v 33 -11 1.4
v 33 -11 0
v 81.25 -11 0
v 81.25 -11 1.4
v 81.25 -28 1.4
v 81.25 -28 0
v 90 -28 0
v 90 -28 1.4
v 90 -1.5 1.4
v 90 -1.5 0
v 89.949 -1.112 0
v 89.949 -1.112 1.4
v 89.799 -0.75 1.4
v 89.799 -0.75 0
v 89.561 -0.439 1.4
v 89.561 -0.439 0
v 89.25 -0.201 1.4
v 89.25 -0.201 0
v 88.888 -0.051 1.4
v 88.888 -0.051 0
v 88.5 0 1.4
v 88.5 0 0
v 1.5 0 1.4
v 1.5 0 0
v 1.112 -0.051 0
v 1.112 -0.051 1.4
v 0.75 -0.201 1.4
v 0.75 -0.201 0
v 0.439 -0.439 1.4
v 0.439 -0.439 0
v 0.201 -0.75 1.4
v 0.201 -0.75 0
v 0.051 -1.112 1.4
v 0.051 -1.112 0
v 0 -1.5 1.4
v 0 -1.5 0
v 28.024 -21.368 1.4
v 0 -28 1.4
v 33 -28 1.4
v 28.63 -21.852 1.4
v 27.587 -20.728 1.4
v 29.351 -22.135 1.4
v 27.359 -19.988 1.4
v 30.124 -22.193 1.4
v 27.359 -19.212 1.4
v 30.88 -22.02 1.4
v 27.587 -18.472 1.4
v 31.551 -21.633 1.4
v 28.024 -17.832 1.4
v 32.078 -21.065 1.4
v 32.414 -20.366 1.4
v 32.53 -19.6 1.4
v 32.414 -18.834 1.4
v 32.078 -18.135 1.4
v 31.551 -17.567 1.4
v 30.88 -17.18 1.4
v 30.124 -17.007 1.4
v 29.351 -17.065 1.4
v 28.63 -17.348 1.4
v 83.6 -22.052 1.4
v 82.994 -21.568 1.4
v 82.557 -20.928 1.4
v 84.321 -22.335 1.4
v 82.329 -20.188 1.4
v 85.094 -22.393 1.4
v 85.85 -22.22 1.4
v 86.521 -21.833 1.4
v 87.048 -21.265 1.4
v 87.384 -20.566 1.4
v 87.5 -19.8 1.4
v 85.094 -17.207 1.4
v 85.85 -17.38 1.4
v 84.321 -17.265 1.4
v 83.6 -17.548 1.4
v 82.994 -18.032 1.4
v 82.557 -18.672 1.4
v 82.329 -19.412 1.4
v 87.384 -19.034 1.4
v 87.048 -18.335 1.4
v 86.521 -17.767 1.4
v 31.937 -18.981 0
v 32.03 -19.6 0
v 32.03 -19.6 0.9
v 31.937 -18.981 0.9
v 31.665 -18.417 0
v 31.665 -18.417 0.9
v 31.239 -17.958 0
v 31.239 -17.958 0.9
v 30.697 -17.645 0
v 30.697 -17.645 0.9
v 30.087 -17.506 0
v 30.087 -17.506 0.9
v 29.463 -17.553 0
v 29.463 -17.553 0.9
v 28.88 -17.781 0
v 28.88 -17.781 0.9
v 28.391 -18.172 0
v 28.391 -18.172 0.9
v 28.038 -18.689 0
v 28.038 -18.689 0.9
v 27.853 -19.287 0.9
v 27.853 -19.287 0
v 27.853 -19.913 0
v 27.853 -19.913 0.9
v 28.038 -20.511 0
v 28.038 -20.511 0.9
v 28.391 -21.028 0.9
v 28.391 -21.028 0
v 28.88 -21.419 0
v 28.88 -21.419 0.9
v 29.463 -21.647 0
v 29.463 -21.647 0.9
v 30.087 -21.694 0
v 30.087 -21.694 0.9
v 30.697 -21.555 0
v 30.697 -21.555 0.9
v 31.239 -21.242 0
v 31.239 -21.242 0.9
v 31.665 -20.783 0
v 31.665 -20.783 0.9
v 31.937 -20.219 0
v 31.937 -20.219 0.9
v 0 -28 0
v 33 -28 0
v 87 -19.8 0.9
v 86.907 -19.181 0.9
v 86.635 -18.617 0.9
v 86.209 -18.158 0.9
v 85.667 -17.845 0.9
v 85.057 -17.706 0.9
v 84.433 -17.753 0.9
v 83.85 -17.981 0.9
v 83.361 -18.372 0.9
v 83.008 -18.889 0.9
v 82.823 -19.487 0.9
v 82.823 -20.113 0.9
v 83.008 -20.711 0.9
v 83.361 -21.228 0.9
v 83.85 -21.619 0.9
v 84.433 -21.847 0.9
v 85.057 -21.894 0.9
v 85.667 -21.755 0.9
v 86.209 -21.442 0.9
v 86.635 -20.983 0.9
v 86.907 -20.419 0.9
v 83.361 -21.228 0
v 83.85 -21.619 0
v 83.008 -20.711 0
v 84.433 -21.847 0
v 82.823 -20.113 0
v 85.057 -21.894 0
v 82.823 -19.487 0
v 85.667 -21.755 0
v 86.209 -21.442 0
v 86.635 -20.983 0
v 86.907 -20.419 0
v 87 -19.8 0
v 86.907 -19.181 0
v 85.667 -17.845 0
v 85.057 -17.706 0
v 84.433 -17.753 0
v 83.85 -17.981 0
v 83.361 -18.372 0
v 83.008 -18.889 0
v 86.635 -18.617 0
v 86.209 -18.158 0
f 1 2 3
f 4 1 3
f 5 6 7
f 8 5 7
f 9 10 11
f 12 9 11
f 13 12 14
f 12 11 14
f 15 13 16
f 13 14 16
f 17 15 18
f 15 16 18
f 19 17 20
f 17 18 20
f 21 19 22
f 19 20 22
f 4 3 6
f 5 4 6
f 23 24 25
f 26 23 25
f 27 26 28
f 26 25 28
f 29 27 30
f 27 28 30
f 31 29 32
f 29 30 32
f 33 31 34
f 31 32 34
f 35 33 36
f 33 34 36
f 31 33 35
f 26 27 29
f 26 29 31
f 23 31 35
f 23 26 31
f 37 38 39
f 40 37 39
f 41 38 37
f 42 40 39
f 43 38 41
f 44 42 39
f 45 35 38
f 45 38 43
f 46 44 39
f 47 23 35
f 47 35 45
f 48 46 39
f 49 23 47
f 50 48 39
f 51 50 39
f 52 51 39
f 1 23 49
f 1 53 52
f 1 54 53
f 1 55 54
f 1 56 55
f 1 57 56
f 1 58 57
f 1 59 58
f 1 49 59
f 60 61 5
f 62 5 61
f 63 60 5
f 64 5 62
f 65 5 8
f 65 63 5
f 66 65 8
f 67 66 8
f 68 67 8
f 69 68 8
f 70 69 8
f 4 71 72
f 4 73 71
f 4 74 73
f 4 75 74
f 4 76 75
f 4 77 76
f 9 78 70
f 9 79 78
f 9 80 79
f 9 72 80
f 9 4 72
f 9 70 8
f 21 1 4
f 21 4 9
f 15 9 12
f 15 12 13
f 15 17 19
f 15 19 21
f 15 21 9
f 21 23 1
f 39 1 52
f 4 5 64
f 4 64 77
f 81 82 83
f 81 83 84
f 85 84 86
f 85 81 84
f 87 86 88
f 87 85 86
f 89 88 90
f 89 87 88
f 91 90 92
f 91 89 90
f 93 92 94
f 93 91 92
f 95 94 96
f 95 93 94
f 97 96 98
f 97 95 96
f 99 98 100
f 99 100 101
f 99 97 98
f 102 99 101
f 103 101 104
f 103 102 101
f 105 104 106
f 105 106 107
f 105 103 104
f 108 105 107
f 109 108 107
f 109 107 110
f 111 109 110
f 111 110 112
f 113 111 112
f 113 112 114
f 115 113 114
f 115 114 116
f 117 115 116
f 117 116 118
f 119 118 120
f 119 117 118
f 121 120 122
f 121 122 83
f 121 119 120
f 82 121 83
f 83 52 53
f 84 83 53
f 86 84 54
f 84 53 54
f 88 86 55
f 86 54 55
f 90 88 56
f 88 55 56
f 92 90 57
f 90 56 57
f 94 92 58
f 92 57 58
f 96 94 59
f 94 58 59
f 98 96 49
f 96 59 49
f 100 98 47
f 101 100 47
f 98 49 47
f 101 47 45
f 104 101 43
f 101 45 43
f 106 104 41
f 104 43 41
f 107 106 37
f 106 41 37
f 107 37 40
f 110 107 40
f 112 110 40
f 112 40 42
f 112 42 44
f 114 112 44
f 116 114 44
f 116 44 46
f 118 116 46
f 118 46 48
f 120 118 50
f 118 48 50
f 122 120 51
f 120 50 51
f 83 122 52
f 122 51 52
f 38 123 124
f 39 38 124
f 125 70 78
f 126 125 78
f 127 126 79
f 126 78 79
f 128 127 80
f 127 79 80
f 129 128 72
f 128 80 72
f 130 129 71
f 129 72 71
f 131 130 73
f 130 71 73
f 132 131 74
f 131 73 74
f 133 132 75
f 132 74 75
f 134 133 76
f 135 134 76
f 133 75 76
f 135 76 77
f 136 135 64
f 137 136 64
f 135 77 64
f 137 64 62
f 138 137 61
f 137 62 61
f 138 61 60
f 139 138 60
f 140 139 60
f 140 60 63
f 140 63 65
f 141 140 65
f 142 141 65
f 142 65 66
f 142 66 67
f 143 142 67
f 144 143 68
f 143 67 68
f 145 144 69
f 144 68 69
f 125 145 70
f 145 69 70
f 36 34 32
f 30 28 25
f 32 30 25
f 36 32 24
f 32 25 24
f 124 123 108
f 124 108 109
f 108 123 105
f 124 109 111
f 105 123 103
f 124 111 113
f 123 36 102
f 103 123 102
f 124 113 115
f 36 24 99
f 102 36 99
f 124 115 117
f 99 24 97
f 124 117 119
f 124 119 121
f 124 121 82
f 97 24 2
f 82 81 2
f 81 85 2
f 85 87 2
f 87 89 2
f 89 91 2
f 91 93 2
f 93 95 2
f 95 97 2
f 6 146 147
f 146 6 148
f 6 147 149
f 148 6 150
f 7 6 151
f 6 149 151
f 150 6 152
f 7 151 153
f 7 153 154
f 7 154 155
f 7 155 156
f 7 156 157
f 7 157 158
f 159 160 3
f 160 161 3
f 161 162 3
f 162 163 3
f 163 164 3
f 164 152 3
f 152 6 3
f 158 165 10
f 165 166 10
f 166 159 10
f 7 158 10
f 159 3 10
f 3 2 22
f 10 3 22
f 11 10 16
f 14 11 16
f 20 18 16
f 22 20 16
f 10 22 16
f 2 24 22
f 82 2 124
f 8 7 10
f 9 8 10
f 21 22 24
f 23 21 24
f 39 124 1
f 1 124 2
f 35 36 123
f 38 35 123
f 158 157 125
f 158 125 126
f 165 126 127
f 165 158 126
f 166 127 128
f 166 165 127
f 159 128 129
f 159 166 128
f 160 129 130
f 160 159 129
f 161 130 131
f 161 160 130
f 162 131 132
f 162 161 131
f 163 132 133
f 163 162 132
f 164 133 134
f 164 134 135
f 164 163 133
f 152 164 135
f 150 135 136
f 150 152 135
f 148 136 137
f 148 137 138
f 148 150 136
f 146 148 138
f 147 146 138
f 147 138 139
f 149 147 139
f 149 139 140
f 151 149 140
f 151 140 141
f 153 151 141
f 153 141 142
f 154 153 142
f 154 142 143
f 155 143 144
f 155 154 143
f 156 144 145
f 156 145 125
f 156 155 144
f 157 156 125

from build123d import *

# Parameters (mm, degrees)
F0_R     = 2.1
F1_DEPTH = 1.4
F2_SIZE  = 0.5


with BuildPart() as f1:
    # F0 (on Top) → F1 (new body)
    with BuildSketch(Plane.XY):
        with BuildLine():
            Line((88.5, 0), (1.5, 0))
            ThreePointArc((1.5, 0), (0.43934, -0.43934), (0, -1.5))
            Line((0, -1.5), (0, -28))
            Line((0, -28), (33, -28))
            Line((33, -28), (33, -11))
            Line((33, -11), (81.25, -11))
            Line((81.25, -11), (81.25, -28))
            Line((81.25, -28), (90, -28))
            Line((90, -28), (90, -1.5))
            ThreePointArc((90, -1.5), (89.56066, -0.43934), (88.5, 0))
        make_face()
        with Locations((29.93, -19.6)):
            Circle(F0_R, mode=Mode.SUBTRACT)
        with Locations((84.9, -19.8)):
            Circle(F0_R, mode=Mode.SUBTRACT)
    extrude(amount=F1_DEPTH)

    # F2
    f2_edges = [f1.edges().sort_by_distance(p)[0] for p in [
        (27.83, -19.6, 1.4),
        (82.8, -19.8, 1.4),
    ]]
    chamfer(f2_edges, length=F2_SIZE)


solid = f1.part
